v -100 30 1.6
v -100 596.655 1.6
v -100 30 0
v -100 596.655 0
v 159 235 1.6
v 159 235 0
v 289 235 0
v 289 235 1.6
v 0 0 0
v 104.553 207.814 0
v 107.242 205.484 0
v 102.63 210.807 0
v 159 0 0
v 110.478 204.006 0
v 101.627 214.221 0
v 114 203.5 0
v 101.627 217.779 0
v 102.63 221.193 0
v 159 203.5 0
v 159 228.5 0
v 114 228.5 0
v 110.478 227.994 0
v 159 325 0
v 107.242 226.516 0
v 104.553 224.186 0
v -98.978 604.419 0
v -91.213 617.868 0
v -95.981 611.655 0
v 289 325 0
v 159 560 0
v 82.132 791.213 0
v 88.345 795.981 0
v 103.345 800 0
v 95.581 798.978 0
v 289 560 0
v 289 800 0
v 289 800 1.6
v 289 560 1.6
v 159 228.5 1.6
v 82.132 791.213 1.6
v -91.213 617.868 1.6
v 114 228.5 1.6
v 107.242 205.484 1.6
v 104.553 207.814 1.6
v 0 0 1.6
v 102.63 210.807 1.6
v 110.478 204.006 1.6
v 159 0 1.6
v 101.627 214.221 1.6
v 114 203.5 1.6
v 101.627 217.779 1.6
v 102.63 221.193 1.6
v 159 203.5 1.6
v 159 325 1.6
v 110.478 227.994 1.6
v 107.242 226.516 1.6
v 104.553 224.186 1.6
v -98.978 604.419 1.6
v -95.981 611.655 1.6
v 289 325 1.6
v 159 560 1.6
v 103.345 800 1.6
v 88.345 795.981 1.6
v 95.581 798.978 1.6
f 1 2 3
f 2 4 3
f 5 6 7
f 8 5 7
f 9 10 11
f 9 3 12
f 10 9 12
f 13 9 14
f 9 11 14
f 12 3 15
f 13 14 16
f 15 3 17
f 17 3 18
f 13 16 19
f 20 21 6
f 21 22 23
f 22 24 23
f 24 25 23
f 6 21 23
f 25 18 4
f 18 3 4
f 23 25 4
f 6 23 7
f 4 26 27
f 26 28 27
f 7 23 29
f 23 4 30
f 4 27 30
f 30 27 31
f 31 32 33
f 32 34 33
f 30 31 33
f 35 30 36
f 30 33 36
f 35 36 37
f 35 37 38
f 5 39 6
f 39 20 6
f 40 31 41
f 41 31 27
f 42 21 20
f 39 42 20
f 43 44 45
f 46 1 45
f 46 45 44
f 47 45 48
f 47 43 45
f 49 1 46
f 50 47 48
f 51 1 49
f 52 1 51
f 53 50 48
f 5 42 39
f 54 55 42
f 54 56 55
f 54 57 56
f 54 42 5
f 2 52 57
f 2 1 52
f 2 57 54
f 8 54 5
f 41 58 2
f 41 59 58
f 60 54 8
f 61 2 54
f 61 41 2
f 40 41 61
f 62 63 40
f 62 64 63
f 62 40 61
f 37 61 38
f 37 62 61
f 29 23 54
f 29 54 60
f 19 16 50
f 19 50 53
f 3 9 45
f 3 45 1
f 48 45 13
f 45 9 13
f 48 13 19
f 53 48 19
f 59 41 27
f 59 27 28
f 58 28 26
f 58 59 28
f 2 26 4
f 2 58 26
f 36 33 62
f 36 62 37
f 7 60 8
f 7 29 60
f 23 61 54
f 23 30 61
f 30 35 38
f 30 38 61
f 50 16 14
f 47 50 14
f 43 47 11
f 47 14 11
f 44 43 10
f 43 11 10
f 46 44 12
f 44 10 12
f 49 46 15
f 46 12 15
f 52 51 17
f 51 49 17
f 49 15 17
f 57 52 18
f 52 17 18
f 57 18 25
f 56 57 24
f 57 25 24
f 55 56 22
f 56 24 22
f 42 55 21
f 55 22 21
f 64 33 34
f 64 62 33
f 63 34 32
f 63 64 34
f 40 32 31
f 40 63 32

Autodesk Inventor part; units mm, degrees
ref_plane "YZ Plane" through (0, 0, 0) normal (1, 0, 0) x (0, 1, 0)
ref_plane "XZ Plane" through (0, 0, 0) normal (0, 1, 0) x (-1, 0, 0)
ref_plane "XY Plane" through (0, 0, 0) normal (0, 0, 1) x (1, 0, 0)
sketch "Sketch1" plane through (0, 0, 0) normal (0, 0, 1) x (1, 0, 0)
  line L0 (0, 0) -> (159, 0)
  line L1 (0, 0) -> (-100, 30)
  line L2 (0, 0) -> (236.9147, 0) construction
  line L3 (-100, 609.0812) -> (-100, 30)
  line L4 (90.9188, 800) -> (289, 800)
  line L5 (289, 800) -> (289, 560)
  line L6 (289, 560) -> (159, 560)
  line L7 (159, 235) -> (289, 235)
  line L8 (289, 325) -> (289, 235)
  line L9 (114, 203.5) -> (159, 203.5)
  line L10 (114, 228.5) -> (159, 228.5)
  arc A0 (114, 228.5) -> (114, 203.5) centre (114, 216) ccw
  line L11 (159, 0) -> (159, 203.5)
  line L12 (159, 228.5) -> (159, 235)
  line L13 (159, 560) -> (159, 325)
  line L14 (159, 325) -> (289, 325)
  line L15 (90.9188, 800) -> (-100, 609.0812)
  line L16 (90.9188, 800) -> (360.9188, 800) construction
  dimension "d0" = 159
  dimension "d3" = 100
  dimension "d6" = 800
  dimension "d7" = 240
  dimension "d8" = 130
  dimension "d11" = 235
  dimension "d14" = 25
  dimension "d16" = 216
  dimension "d18" = 45
  dimension "d19" = 389
  dimension "d22" = 130
  dimension "d23" = 235
  dimension "d25" = 30
  dimension "d26" = 270
  dimension "d27" = 135
extrude "Extrusion1" add sketch "Sketch1" along normal blind 1.6
fillet "Fillet1" radius 30 2 edges at (-100, 609.0812, 0.8) (90.9188, 800, 0.8)
equation "\"d22\" = d8"
equation "\"BendRadius\" = Thickness"
equation "\"BendReliefWidth\" = Thickness"
equation "\"BendReliefDepth\" = 0.5 * Thickness"
equation "\"CornerReliefSize\" = 4 * Thickness"
equation "\"MinimumRemnant\" = 2 * Thickness"
equation "\"TransitionRadius\" = BendRadius"
equation "\"JacobiRadiusSize\" = Thickness"
equation "\"GapSize\" = Thickness"
equation "\"Thickness\" = 0.5"
properties part number "Gearbox-Side Cover Part 1" material "Steel"
